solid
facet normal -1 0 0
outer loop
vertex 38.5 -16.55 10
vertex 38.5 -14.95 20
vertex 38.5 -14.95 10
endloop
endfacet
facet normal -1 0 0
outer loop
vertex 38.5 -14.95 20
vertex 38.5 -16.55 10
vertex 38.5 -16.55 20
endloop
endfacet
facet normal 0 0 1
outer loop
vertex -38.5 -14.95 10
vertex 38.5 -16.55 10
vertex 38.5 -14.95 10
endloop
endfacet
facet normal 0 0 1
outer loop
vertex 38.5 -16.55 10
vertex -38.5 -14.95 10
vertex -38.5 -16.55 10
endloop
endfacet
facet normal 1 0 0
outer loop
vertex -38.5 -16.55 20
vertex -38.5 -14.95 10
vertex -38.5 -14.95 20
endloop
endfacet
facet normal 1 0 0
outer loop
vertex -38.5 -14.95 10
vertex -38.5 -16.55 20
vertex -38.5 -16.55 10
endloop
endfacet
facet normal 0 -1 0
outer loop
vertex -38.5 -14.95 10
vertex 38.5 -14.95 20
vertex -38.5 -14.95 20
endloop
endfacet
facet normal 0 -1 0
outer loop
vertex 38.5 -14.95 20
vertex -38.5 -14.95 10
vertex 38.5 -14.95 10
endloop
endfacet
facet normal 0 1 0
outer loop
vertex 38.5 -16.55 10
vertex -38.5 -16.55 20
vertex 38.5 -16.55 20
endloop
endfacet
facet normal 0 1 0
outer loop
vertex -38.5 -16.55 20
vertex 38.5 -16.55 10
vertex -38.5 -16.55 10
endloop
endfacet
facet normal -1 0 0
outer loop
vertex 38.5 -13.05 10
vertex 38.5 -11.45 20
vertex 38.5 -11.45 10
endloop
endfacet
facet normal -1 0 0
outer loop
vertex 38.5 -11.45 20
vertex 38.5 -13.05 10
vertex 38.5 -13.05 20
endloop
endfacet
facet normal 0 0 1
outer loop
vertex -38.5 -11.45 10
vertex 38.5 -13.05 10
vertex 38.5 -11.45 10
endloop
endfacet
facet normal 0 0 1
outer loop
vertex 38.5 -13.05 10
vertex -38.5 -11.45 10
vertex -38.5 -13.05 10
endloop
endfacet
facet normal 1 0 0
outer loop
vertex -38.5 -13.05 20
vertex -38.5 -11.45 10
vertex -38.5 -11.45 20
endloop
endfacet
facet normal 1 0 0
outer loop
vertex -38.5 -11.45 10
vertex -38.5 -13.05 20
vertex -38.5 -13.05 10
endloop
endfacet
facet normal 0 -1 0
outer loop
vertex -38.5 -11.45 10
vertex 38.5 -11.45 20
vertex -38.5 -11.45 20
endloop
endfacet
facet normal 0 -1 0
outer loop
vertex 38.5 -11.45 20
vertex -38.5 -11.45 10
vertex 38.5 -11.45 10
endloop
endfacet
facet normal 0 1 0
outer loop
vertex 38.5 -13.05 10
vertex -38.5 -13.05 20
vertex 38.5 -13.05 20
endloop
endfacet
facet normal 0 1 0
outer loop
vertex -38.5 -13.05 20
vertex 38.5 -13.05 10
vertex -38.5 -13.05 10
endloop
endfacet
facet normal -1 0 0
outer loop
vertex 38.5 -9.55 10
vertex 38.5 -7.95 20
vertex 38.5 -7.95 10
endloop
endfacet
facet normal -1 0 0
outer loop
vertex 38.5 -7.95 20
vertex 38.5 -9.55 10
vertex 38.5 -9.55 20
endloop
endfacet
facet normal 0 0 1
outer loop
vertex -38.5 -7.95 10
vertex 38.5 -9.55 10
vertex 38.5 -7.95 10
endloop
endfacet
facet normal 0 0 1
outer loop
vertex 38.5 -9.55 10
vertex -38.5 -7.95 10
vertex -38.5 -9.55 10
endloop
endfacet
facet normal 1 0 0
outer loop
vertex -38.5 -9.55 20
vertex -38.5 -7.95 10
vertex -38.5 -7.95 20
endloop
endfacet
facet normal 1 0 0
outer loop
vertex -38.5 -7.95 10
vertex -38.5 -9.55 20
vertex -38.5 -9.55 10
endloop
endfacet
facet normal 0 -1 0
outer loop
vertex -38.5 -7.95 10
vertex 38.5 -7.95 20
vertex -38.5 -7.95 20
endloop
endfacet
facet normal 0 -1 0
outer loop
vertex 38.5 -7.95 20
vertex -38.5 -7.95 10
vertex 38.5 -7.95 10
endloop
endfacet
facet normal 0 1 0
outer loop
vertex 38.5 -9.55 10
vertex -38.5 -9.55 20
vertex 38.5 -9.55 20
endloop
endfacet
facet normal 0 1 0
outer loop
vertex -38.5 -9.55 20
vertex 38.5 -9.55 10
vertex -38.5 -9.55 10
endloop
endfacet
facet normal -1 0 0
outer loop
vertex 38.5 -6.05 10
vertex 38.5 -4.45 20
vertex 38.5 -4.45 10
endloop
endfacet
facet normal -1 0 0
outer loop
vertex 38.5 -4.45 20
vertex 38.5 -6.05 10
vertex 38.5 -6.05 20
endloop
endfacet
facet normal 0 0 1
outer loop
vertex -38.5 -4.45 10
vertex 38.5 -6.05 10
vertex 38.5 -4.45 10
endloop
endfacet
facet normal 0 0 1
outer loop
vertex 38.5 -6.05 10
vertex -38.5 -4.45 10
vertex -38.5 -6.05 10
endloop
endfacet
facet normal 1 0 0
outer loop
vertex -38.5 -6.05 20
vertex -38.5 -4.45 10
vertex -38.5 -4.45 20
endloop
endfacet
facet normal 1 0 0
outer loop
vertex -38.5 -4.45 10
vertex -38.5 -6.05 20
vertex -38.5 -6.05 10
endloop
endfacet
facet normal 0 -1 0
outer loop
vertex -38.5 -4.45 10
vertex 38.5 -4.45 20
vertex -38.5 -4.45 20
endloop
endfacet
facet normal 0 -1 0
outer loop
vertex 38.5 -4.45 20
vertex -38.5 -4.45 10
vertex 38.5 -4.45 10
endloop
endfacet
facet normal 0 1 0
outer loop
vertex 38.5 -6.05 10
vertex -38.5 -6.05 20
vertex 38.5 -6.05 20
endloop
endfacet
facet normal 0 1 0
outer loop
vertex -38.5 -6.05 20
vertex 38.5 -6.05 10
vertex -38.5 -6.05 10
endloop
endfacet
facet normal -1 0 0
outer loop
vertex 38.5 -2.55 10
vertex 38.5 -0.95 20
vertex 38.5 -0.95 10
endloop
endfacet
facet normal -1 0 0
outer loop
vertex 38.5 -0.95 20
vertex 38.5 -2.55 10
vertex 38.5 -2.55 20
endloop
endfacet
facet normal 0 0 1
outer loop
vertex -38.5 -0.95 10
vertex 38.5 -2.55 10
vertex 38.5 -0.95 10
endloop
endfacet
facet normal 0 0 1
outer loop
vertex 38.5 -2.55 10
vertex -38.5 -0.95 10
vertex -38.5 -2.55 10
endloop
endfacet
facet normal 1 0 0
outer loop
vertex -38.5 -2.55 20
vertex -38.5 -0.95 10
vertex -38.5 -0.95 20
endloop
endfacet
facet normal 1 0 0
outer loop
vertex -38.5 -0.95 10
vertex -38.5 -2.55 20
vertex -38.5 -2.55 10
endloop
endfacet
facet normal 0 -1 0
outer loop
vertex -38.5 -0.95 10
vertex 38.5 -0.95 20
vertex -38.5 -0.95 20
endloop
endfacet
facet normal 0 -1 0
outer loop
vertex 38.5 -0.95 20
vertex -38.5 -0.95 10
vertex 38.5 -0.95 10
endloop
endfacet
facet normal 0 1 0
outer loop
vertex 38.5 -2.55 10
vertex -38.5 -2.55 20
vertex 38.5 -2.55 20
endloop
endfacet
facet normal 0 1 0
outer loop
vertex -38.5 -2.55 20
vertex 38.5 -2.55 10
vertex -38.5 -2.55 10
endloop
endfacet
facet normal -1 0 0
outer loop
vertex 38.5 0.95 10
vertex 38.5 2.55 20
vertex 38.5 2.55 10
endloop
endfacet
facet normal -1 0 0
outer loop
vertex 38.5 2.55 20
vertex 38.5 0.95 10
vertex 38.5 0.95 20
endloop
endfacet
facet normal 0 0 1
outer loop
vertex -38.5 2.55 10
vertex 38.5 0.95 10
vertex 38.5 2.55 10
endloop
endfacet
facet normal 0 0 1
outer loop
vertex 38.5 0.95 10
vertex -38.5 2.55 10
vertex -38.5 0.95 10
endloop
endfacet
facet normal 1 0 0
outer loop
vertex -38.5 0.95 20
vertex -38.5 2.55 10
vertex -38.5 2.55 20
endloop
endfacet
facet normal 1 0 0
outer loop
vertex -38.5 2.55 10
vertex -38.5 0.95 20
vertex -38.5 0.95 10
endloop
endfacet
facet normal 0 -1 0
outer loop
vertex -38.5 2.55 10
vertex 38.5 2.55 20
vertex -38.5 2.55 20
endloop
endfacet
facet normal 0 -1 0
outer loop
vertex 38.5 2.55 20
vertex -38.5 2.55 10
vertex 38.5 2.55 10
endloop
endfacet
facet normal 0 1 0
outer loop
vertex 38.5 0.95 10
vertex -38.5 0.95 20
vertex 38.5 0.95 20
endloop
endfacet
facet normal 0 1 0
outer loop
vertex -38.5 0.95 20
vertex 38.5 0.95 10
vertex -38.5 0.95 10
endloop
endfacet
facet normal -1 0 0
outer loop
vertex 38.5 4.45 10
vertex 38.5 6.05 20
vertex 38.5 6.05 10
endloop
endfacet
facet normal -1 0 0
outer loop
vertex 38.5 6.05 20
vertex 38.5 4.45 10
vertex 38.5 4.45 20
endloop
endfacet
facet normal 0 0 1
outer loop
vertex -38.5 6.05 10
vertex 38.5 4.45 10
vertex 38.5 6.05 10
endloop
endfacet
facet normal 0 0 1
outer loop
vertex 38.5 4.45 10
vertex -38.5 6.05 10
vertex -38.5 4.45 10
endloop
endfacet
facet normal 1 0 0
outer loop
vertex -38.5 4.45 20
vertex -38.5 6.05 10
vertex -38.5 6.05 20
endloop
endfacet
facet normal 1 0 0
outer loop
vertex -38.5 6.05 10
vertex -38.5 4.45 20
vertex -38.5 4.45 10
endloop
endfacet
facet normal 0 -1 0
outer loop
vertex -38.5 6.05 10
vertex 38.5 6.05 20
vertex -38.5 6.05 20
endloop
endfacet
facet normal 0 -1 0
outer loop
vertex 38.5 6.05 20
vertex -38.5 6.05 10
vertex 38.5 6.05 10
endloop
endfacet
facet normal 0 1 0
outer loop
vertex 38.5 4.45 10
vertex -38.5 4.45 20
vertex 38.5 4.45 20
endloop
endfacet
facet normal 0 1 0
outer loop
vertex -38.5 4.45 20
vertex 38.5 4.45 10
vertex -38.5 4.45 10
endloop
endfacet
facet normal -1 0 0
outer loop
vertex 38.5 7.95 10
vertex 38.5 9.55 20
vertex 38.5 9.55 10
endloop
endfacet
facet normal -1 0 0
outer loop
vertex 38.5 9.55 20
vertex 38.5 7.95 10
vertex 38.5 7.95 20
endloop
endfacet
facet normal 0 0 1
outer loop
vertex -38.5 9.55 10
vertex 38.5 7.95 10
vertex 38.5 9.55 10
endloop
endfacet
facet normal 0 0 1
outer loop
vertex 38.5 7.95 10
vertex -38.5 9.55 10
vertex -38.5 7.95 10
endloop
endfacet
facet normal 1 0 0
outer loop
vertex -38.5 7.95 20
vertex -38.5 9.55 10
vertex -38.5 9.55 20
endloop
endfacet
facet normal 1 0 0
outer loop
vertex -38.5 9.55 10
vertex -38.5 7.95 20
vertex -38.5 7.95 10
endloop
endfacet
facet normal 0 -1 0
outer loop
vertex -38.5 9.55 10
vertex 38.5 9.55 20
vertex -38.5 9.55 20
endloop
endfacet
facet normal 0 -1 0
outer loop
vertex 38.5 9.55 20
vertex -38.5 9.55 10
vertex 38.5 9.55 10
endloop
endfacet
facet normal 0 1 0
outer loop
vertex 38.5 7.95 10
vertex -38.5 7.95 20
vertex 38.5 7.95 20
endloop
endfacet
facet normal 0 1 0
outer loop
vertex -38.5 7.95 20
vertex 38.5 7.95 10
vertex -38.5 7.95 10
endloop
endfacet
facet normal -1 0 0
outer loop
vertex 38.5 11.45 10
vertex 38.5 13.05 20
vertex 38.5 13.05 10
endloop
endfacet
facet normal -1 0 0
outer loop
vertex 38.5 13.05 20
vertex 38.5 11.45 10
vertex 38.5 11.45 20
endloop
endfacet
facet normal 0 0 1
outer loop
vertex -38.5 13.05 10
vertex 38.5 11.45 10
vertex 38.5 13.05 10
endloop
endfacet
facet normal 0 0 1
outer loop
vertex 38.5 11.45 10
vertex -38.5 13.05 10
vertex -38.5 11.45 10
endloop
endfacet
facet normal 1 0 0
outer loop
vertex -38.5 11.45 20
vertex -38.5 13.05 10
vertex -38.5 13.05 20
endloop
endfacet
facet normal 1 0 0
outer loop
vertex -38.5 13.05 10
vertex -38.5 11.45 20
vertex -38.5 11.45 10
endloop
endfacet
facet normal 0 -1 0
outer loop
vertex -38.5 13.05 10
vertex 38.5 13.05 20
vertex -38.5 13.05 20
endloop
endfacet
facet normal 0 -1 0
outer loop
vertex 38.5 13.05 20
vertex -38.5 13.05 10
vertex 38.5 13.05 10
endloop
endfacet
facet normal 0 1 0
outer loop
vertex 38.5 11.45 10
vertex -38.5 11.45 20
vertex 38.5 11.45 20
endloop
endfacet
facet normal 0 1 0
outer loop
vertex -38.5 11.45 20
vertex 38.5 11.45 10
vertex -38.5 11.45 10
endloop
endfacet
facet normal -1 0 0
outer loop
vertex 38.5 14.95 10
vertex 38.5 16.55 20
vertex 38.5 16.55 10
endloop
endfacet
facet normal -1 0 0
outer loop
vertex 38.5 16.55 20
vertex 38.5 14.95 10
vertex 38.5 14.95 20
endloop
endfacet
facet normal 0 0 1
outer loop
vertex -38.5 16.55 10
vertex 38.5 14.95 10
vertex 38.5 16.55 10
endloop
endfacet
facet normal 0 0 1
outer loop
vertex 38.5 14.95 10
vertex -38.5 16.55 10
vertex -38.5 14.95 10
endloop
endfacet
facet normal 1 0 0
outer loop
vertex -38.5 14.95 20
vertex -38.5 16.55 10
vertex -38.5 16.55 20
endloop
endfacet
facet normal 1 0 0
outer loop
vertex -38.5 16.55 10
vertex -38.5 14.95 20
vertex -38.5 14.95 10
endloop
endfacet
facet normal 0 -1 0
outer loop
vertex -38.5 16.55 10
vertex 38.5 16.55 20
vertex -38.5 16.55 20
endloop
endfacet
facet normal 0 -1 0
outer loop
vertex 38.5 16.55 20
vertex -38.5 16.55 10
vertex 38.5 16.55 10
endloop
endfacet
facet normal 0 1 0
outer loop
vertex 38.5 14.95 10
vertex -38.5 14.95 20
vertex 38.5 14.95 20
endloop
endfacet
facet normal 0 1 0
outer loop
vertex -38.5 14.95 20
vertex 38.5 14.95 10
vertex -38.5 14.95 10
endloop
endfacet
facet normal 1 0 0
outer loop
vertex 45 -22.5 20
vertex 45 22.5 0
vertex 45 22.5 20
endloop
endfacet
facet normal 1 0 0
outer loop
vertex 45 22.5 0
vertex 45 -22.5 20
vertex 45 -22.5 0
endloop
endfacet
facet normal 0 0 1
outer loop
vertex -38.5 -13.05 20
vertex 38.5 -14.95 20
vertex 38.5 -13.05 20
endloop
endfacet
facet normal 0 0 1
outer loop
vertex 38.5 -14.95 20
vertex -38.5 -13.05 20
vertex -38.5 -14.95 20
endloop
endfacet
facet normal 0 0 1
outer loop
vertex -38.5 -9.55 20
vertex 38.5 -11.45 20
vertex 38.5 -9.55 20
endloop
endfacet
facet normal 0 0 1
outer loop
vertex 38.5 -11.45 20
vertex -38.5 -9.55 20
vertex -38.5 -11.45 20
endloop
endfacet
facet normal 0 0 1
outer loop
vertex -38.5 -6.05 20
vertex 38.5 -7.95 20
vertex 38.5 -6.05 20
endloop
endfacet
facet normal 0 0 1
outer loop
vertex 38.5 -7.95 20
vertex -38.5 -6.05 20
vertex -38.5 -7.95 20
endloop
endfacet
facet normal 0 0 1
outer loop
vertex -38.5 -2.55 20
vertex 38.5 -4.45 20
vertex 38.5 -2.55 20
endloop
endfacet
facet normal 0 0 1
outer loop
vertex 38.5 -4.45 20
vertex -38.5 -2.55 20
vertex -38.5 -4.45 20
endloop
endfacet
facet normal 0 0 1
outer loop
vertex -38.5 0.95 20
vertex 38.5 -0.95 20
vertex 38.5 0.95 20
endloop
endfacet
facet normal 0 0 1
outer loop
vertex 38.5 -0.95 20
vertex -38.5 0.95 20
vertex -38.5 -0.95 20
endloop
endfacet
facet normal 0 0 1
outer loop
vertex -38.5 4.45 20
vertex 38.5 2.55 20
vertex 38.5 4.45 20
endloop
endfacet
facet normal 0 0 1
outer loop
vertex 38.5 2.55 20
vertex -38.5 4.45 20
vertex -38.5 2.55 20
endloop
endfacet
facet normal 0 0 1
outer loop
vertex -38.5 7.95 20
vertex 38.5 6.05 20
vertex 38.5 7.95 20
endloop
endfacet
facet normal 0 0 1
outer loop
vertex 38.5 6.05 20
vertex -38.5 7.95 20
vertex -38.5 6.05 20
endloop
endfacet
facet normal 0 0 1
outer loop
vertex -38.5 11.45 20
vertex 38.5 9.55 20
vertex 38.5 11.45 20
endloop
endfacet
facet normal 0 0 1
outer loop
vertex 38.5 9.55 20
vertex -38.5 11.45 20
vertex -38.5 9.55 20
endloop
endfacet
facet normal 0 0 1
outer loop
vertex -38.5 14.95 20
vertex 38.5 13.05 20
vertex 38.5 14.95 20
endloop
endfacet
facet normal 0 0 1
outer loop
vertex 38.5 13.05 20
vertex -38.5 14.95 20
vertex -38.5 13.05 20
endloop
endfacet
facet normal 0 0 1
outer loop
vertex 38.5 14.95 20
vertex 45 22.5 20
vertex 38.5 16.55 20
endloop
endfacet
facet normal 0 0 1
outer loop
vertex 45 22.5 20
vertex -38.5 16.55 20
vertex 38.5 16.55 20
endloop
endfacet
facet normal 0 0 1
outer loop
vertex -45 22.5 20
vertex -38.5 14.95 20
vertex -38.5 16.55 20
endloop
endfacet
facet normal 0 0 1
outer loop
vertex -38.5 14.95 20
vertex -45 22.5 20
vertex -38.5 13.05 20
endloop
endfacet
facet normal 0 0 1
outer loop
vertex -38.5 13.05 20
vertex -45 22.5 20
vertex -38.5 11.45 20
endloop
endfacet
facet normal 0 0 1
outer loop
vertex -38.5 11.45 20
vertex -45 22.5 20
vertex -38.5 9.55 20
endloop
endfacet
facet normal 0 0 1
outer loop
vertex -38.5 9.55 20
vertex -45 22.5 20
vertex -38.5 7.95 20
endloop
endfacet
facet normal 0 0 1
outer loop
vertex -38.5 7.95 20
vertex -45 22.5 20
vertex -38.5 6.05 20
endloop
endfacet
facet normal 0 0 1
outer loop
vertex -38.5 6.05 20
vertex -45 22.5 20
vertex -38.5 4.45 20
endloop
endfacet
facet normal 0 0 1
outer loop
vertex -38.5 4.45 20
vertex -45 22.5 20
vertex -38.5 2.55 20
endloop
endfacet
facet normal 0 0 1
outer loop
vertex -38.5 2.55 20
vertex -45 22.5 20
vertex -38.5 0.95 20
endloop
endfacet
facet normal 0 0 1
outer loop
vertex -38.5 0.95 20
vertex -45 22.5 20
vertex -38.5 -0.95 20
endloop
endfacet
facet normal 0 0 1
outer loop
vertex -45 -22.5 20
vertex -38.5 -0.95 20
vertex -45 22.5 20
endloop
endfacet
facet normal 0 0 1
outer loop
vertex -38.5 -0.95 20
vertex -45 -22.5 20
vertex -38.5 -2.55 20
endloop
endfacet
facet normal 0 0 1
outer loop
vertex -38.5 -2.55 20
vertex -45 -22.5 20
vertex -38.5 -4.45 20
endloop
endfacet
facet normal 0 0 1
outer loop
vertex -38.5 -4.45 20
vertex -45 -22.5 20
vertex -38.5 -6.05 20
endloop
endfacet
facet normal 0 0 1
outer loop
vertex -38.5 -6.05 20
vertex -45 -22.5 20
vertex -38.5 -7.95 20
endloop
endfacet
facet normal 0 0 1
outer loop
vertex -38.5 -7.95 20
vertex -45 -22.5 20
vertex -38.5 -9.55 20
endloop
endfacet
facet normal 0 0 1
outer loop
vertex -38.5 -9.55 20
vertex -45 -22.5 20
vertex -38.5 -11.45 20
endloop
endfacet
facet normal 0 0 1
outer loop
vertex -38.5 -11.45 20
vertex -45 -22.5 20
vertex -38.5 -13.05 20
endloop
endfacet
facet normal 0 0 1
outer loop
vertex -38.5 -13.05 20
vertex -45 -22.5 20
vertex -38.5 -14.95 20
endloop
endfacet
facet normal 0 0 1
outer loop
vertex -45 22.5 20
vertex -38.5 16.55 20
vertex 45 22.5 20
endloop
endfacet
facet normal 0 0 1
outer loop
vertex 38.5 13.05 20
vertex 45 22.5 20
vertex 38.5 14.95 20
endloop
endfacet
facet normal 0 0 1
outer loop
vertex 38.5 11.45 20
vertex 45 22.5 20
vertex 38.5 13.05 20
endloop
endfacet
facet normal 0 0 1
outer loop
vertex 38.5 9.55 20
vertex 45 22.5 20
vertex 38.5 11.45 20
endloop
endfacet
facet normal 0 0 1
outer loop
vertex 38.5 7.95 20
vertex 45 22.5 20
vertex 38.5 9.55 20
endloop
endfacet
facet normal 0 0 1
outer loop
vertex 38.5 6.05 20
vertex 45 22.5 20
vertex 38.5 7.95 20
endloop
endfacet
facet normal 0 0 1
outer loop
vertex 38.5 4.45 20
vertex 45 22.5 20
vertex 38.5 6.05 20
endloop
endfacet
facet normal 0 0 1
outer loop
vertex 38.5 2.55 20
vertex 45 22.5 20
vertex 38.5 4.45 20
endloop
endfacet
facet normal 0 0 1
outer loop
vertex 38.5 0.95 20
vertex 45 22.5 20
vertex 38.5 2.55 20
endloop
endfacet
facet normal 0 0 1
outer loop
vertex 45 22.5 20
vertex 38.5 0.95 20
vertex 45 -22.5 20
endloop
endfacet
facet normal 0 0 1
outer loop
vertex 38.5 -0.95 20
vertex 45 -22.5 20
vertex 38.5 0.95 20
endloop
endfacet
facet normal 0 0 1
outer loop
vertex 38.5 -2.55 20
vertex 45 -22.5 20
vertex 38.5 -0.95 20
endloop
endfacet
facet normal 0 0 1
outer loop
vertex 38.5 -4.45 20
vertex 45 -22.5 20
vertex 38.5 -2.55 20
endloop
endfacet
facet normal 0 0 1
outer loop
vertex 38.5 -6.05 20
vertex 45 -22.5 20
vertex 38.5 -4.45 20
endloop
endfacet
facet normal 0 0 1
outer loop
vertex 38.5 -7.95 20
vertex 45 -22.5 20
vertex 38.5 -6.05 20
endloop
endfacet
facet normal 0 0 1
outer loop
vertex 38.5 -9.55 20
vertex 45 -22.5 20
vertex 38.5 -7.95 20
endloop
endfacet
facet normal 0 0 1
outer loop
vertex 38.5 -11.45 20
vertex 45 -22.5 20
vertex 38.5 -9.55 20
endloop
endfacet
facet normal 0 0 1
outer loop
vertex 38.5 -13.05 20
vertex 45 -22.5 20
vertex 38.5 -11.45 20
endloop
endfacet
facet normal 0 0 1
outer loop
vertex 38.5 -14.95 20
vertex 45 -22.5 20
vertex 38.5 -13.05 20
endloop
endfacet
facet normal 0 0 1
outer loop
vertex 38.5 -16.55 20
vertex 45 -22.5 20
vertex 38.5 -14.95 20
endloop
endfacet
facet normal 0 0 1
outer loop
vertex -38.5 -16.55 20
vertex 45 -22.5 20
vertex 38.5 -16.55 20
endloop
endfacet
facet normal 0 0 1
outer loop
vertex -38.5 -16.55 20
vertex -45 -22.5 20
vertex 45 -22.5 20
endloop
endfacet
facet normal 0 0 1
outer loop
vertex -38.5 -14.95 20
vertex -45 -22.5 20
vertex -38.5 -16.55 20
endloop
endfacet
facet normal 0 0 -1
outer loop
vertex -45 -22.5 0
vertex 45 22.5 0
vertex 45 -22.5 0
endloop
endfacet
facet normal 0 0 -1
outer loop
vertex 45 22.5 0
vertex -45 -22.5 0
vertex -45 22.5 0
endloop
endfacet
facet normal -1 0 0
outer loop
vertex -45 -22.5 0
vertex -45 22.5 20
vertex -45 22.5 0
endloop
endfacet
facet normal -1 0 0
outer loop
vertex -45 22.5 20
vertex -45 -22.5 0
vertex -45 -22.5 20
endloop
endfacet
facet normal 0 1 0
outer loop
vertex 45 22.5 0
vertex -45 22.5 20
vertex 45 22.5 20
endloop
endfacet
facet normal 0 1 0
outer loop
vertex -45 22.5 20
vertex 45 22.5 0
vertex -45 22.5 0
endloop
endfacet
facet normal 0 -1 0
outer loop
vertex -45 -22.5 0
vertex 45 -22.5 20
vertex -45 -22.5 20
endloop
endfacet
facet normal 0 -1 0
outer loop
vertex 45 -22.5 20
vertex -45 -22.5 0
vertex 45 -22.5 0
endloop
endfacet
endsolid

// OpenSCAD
// Slide drying rack - holds 10 microscope slides (75 x 25 x 1 mm) upright on their long edge
// Print orientation: base block on the bed, slots open upward (+Z)

// ---------- Parameters ----------
base_len      = 90;    // base block length along X (mm)
base_wid      = 45;    // base block width along Y (mm)
base_ht      = 20;     // base block height along Z (mm)

slot_len      = 77;    // slot length along X (mm)
slot_w        = 1.6;   // slot width along Y (mm)
slot_depth    = 10;    // slot depth into the block (mm)
slot_pitch    = 3.5;   // centre-to-centre slot spacing along Y (mm)
slot_count    = 10;    // number of slots

eps           = 0.5;   // cutter overshoot past the top face (mm)

$fn = 64;

// ---------- Model ----------
difference() {
    // Solid base block, centred in X and Y, resting on z = 0
    translate([-base_len/2, -base_wid/2, 0])
        cube([base_len, base_wid, base_ht]);

    // Row of parallel slots, centred on the block in X and Y
    for (i = [0 : slot_count - 1]) {
        y = (i - (slot_count - 1)/2) * slot_pitch;
        translate([-slot_len/2, y - slot_w/2, base_ht - slot_depth])
            cube([slot_len, slot_w, slot_depth + eps]);
    }
}
